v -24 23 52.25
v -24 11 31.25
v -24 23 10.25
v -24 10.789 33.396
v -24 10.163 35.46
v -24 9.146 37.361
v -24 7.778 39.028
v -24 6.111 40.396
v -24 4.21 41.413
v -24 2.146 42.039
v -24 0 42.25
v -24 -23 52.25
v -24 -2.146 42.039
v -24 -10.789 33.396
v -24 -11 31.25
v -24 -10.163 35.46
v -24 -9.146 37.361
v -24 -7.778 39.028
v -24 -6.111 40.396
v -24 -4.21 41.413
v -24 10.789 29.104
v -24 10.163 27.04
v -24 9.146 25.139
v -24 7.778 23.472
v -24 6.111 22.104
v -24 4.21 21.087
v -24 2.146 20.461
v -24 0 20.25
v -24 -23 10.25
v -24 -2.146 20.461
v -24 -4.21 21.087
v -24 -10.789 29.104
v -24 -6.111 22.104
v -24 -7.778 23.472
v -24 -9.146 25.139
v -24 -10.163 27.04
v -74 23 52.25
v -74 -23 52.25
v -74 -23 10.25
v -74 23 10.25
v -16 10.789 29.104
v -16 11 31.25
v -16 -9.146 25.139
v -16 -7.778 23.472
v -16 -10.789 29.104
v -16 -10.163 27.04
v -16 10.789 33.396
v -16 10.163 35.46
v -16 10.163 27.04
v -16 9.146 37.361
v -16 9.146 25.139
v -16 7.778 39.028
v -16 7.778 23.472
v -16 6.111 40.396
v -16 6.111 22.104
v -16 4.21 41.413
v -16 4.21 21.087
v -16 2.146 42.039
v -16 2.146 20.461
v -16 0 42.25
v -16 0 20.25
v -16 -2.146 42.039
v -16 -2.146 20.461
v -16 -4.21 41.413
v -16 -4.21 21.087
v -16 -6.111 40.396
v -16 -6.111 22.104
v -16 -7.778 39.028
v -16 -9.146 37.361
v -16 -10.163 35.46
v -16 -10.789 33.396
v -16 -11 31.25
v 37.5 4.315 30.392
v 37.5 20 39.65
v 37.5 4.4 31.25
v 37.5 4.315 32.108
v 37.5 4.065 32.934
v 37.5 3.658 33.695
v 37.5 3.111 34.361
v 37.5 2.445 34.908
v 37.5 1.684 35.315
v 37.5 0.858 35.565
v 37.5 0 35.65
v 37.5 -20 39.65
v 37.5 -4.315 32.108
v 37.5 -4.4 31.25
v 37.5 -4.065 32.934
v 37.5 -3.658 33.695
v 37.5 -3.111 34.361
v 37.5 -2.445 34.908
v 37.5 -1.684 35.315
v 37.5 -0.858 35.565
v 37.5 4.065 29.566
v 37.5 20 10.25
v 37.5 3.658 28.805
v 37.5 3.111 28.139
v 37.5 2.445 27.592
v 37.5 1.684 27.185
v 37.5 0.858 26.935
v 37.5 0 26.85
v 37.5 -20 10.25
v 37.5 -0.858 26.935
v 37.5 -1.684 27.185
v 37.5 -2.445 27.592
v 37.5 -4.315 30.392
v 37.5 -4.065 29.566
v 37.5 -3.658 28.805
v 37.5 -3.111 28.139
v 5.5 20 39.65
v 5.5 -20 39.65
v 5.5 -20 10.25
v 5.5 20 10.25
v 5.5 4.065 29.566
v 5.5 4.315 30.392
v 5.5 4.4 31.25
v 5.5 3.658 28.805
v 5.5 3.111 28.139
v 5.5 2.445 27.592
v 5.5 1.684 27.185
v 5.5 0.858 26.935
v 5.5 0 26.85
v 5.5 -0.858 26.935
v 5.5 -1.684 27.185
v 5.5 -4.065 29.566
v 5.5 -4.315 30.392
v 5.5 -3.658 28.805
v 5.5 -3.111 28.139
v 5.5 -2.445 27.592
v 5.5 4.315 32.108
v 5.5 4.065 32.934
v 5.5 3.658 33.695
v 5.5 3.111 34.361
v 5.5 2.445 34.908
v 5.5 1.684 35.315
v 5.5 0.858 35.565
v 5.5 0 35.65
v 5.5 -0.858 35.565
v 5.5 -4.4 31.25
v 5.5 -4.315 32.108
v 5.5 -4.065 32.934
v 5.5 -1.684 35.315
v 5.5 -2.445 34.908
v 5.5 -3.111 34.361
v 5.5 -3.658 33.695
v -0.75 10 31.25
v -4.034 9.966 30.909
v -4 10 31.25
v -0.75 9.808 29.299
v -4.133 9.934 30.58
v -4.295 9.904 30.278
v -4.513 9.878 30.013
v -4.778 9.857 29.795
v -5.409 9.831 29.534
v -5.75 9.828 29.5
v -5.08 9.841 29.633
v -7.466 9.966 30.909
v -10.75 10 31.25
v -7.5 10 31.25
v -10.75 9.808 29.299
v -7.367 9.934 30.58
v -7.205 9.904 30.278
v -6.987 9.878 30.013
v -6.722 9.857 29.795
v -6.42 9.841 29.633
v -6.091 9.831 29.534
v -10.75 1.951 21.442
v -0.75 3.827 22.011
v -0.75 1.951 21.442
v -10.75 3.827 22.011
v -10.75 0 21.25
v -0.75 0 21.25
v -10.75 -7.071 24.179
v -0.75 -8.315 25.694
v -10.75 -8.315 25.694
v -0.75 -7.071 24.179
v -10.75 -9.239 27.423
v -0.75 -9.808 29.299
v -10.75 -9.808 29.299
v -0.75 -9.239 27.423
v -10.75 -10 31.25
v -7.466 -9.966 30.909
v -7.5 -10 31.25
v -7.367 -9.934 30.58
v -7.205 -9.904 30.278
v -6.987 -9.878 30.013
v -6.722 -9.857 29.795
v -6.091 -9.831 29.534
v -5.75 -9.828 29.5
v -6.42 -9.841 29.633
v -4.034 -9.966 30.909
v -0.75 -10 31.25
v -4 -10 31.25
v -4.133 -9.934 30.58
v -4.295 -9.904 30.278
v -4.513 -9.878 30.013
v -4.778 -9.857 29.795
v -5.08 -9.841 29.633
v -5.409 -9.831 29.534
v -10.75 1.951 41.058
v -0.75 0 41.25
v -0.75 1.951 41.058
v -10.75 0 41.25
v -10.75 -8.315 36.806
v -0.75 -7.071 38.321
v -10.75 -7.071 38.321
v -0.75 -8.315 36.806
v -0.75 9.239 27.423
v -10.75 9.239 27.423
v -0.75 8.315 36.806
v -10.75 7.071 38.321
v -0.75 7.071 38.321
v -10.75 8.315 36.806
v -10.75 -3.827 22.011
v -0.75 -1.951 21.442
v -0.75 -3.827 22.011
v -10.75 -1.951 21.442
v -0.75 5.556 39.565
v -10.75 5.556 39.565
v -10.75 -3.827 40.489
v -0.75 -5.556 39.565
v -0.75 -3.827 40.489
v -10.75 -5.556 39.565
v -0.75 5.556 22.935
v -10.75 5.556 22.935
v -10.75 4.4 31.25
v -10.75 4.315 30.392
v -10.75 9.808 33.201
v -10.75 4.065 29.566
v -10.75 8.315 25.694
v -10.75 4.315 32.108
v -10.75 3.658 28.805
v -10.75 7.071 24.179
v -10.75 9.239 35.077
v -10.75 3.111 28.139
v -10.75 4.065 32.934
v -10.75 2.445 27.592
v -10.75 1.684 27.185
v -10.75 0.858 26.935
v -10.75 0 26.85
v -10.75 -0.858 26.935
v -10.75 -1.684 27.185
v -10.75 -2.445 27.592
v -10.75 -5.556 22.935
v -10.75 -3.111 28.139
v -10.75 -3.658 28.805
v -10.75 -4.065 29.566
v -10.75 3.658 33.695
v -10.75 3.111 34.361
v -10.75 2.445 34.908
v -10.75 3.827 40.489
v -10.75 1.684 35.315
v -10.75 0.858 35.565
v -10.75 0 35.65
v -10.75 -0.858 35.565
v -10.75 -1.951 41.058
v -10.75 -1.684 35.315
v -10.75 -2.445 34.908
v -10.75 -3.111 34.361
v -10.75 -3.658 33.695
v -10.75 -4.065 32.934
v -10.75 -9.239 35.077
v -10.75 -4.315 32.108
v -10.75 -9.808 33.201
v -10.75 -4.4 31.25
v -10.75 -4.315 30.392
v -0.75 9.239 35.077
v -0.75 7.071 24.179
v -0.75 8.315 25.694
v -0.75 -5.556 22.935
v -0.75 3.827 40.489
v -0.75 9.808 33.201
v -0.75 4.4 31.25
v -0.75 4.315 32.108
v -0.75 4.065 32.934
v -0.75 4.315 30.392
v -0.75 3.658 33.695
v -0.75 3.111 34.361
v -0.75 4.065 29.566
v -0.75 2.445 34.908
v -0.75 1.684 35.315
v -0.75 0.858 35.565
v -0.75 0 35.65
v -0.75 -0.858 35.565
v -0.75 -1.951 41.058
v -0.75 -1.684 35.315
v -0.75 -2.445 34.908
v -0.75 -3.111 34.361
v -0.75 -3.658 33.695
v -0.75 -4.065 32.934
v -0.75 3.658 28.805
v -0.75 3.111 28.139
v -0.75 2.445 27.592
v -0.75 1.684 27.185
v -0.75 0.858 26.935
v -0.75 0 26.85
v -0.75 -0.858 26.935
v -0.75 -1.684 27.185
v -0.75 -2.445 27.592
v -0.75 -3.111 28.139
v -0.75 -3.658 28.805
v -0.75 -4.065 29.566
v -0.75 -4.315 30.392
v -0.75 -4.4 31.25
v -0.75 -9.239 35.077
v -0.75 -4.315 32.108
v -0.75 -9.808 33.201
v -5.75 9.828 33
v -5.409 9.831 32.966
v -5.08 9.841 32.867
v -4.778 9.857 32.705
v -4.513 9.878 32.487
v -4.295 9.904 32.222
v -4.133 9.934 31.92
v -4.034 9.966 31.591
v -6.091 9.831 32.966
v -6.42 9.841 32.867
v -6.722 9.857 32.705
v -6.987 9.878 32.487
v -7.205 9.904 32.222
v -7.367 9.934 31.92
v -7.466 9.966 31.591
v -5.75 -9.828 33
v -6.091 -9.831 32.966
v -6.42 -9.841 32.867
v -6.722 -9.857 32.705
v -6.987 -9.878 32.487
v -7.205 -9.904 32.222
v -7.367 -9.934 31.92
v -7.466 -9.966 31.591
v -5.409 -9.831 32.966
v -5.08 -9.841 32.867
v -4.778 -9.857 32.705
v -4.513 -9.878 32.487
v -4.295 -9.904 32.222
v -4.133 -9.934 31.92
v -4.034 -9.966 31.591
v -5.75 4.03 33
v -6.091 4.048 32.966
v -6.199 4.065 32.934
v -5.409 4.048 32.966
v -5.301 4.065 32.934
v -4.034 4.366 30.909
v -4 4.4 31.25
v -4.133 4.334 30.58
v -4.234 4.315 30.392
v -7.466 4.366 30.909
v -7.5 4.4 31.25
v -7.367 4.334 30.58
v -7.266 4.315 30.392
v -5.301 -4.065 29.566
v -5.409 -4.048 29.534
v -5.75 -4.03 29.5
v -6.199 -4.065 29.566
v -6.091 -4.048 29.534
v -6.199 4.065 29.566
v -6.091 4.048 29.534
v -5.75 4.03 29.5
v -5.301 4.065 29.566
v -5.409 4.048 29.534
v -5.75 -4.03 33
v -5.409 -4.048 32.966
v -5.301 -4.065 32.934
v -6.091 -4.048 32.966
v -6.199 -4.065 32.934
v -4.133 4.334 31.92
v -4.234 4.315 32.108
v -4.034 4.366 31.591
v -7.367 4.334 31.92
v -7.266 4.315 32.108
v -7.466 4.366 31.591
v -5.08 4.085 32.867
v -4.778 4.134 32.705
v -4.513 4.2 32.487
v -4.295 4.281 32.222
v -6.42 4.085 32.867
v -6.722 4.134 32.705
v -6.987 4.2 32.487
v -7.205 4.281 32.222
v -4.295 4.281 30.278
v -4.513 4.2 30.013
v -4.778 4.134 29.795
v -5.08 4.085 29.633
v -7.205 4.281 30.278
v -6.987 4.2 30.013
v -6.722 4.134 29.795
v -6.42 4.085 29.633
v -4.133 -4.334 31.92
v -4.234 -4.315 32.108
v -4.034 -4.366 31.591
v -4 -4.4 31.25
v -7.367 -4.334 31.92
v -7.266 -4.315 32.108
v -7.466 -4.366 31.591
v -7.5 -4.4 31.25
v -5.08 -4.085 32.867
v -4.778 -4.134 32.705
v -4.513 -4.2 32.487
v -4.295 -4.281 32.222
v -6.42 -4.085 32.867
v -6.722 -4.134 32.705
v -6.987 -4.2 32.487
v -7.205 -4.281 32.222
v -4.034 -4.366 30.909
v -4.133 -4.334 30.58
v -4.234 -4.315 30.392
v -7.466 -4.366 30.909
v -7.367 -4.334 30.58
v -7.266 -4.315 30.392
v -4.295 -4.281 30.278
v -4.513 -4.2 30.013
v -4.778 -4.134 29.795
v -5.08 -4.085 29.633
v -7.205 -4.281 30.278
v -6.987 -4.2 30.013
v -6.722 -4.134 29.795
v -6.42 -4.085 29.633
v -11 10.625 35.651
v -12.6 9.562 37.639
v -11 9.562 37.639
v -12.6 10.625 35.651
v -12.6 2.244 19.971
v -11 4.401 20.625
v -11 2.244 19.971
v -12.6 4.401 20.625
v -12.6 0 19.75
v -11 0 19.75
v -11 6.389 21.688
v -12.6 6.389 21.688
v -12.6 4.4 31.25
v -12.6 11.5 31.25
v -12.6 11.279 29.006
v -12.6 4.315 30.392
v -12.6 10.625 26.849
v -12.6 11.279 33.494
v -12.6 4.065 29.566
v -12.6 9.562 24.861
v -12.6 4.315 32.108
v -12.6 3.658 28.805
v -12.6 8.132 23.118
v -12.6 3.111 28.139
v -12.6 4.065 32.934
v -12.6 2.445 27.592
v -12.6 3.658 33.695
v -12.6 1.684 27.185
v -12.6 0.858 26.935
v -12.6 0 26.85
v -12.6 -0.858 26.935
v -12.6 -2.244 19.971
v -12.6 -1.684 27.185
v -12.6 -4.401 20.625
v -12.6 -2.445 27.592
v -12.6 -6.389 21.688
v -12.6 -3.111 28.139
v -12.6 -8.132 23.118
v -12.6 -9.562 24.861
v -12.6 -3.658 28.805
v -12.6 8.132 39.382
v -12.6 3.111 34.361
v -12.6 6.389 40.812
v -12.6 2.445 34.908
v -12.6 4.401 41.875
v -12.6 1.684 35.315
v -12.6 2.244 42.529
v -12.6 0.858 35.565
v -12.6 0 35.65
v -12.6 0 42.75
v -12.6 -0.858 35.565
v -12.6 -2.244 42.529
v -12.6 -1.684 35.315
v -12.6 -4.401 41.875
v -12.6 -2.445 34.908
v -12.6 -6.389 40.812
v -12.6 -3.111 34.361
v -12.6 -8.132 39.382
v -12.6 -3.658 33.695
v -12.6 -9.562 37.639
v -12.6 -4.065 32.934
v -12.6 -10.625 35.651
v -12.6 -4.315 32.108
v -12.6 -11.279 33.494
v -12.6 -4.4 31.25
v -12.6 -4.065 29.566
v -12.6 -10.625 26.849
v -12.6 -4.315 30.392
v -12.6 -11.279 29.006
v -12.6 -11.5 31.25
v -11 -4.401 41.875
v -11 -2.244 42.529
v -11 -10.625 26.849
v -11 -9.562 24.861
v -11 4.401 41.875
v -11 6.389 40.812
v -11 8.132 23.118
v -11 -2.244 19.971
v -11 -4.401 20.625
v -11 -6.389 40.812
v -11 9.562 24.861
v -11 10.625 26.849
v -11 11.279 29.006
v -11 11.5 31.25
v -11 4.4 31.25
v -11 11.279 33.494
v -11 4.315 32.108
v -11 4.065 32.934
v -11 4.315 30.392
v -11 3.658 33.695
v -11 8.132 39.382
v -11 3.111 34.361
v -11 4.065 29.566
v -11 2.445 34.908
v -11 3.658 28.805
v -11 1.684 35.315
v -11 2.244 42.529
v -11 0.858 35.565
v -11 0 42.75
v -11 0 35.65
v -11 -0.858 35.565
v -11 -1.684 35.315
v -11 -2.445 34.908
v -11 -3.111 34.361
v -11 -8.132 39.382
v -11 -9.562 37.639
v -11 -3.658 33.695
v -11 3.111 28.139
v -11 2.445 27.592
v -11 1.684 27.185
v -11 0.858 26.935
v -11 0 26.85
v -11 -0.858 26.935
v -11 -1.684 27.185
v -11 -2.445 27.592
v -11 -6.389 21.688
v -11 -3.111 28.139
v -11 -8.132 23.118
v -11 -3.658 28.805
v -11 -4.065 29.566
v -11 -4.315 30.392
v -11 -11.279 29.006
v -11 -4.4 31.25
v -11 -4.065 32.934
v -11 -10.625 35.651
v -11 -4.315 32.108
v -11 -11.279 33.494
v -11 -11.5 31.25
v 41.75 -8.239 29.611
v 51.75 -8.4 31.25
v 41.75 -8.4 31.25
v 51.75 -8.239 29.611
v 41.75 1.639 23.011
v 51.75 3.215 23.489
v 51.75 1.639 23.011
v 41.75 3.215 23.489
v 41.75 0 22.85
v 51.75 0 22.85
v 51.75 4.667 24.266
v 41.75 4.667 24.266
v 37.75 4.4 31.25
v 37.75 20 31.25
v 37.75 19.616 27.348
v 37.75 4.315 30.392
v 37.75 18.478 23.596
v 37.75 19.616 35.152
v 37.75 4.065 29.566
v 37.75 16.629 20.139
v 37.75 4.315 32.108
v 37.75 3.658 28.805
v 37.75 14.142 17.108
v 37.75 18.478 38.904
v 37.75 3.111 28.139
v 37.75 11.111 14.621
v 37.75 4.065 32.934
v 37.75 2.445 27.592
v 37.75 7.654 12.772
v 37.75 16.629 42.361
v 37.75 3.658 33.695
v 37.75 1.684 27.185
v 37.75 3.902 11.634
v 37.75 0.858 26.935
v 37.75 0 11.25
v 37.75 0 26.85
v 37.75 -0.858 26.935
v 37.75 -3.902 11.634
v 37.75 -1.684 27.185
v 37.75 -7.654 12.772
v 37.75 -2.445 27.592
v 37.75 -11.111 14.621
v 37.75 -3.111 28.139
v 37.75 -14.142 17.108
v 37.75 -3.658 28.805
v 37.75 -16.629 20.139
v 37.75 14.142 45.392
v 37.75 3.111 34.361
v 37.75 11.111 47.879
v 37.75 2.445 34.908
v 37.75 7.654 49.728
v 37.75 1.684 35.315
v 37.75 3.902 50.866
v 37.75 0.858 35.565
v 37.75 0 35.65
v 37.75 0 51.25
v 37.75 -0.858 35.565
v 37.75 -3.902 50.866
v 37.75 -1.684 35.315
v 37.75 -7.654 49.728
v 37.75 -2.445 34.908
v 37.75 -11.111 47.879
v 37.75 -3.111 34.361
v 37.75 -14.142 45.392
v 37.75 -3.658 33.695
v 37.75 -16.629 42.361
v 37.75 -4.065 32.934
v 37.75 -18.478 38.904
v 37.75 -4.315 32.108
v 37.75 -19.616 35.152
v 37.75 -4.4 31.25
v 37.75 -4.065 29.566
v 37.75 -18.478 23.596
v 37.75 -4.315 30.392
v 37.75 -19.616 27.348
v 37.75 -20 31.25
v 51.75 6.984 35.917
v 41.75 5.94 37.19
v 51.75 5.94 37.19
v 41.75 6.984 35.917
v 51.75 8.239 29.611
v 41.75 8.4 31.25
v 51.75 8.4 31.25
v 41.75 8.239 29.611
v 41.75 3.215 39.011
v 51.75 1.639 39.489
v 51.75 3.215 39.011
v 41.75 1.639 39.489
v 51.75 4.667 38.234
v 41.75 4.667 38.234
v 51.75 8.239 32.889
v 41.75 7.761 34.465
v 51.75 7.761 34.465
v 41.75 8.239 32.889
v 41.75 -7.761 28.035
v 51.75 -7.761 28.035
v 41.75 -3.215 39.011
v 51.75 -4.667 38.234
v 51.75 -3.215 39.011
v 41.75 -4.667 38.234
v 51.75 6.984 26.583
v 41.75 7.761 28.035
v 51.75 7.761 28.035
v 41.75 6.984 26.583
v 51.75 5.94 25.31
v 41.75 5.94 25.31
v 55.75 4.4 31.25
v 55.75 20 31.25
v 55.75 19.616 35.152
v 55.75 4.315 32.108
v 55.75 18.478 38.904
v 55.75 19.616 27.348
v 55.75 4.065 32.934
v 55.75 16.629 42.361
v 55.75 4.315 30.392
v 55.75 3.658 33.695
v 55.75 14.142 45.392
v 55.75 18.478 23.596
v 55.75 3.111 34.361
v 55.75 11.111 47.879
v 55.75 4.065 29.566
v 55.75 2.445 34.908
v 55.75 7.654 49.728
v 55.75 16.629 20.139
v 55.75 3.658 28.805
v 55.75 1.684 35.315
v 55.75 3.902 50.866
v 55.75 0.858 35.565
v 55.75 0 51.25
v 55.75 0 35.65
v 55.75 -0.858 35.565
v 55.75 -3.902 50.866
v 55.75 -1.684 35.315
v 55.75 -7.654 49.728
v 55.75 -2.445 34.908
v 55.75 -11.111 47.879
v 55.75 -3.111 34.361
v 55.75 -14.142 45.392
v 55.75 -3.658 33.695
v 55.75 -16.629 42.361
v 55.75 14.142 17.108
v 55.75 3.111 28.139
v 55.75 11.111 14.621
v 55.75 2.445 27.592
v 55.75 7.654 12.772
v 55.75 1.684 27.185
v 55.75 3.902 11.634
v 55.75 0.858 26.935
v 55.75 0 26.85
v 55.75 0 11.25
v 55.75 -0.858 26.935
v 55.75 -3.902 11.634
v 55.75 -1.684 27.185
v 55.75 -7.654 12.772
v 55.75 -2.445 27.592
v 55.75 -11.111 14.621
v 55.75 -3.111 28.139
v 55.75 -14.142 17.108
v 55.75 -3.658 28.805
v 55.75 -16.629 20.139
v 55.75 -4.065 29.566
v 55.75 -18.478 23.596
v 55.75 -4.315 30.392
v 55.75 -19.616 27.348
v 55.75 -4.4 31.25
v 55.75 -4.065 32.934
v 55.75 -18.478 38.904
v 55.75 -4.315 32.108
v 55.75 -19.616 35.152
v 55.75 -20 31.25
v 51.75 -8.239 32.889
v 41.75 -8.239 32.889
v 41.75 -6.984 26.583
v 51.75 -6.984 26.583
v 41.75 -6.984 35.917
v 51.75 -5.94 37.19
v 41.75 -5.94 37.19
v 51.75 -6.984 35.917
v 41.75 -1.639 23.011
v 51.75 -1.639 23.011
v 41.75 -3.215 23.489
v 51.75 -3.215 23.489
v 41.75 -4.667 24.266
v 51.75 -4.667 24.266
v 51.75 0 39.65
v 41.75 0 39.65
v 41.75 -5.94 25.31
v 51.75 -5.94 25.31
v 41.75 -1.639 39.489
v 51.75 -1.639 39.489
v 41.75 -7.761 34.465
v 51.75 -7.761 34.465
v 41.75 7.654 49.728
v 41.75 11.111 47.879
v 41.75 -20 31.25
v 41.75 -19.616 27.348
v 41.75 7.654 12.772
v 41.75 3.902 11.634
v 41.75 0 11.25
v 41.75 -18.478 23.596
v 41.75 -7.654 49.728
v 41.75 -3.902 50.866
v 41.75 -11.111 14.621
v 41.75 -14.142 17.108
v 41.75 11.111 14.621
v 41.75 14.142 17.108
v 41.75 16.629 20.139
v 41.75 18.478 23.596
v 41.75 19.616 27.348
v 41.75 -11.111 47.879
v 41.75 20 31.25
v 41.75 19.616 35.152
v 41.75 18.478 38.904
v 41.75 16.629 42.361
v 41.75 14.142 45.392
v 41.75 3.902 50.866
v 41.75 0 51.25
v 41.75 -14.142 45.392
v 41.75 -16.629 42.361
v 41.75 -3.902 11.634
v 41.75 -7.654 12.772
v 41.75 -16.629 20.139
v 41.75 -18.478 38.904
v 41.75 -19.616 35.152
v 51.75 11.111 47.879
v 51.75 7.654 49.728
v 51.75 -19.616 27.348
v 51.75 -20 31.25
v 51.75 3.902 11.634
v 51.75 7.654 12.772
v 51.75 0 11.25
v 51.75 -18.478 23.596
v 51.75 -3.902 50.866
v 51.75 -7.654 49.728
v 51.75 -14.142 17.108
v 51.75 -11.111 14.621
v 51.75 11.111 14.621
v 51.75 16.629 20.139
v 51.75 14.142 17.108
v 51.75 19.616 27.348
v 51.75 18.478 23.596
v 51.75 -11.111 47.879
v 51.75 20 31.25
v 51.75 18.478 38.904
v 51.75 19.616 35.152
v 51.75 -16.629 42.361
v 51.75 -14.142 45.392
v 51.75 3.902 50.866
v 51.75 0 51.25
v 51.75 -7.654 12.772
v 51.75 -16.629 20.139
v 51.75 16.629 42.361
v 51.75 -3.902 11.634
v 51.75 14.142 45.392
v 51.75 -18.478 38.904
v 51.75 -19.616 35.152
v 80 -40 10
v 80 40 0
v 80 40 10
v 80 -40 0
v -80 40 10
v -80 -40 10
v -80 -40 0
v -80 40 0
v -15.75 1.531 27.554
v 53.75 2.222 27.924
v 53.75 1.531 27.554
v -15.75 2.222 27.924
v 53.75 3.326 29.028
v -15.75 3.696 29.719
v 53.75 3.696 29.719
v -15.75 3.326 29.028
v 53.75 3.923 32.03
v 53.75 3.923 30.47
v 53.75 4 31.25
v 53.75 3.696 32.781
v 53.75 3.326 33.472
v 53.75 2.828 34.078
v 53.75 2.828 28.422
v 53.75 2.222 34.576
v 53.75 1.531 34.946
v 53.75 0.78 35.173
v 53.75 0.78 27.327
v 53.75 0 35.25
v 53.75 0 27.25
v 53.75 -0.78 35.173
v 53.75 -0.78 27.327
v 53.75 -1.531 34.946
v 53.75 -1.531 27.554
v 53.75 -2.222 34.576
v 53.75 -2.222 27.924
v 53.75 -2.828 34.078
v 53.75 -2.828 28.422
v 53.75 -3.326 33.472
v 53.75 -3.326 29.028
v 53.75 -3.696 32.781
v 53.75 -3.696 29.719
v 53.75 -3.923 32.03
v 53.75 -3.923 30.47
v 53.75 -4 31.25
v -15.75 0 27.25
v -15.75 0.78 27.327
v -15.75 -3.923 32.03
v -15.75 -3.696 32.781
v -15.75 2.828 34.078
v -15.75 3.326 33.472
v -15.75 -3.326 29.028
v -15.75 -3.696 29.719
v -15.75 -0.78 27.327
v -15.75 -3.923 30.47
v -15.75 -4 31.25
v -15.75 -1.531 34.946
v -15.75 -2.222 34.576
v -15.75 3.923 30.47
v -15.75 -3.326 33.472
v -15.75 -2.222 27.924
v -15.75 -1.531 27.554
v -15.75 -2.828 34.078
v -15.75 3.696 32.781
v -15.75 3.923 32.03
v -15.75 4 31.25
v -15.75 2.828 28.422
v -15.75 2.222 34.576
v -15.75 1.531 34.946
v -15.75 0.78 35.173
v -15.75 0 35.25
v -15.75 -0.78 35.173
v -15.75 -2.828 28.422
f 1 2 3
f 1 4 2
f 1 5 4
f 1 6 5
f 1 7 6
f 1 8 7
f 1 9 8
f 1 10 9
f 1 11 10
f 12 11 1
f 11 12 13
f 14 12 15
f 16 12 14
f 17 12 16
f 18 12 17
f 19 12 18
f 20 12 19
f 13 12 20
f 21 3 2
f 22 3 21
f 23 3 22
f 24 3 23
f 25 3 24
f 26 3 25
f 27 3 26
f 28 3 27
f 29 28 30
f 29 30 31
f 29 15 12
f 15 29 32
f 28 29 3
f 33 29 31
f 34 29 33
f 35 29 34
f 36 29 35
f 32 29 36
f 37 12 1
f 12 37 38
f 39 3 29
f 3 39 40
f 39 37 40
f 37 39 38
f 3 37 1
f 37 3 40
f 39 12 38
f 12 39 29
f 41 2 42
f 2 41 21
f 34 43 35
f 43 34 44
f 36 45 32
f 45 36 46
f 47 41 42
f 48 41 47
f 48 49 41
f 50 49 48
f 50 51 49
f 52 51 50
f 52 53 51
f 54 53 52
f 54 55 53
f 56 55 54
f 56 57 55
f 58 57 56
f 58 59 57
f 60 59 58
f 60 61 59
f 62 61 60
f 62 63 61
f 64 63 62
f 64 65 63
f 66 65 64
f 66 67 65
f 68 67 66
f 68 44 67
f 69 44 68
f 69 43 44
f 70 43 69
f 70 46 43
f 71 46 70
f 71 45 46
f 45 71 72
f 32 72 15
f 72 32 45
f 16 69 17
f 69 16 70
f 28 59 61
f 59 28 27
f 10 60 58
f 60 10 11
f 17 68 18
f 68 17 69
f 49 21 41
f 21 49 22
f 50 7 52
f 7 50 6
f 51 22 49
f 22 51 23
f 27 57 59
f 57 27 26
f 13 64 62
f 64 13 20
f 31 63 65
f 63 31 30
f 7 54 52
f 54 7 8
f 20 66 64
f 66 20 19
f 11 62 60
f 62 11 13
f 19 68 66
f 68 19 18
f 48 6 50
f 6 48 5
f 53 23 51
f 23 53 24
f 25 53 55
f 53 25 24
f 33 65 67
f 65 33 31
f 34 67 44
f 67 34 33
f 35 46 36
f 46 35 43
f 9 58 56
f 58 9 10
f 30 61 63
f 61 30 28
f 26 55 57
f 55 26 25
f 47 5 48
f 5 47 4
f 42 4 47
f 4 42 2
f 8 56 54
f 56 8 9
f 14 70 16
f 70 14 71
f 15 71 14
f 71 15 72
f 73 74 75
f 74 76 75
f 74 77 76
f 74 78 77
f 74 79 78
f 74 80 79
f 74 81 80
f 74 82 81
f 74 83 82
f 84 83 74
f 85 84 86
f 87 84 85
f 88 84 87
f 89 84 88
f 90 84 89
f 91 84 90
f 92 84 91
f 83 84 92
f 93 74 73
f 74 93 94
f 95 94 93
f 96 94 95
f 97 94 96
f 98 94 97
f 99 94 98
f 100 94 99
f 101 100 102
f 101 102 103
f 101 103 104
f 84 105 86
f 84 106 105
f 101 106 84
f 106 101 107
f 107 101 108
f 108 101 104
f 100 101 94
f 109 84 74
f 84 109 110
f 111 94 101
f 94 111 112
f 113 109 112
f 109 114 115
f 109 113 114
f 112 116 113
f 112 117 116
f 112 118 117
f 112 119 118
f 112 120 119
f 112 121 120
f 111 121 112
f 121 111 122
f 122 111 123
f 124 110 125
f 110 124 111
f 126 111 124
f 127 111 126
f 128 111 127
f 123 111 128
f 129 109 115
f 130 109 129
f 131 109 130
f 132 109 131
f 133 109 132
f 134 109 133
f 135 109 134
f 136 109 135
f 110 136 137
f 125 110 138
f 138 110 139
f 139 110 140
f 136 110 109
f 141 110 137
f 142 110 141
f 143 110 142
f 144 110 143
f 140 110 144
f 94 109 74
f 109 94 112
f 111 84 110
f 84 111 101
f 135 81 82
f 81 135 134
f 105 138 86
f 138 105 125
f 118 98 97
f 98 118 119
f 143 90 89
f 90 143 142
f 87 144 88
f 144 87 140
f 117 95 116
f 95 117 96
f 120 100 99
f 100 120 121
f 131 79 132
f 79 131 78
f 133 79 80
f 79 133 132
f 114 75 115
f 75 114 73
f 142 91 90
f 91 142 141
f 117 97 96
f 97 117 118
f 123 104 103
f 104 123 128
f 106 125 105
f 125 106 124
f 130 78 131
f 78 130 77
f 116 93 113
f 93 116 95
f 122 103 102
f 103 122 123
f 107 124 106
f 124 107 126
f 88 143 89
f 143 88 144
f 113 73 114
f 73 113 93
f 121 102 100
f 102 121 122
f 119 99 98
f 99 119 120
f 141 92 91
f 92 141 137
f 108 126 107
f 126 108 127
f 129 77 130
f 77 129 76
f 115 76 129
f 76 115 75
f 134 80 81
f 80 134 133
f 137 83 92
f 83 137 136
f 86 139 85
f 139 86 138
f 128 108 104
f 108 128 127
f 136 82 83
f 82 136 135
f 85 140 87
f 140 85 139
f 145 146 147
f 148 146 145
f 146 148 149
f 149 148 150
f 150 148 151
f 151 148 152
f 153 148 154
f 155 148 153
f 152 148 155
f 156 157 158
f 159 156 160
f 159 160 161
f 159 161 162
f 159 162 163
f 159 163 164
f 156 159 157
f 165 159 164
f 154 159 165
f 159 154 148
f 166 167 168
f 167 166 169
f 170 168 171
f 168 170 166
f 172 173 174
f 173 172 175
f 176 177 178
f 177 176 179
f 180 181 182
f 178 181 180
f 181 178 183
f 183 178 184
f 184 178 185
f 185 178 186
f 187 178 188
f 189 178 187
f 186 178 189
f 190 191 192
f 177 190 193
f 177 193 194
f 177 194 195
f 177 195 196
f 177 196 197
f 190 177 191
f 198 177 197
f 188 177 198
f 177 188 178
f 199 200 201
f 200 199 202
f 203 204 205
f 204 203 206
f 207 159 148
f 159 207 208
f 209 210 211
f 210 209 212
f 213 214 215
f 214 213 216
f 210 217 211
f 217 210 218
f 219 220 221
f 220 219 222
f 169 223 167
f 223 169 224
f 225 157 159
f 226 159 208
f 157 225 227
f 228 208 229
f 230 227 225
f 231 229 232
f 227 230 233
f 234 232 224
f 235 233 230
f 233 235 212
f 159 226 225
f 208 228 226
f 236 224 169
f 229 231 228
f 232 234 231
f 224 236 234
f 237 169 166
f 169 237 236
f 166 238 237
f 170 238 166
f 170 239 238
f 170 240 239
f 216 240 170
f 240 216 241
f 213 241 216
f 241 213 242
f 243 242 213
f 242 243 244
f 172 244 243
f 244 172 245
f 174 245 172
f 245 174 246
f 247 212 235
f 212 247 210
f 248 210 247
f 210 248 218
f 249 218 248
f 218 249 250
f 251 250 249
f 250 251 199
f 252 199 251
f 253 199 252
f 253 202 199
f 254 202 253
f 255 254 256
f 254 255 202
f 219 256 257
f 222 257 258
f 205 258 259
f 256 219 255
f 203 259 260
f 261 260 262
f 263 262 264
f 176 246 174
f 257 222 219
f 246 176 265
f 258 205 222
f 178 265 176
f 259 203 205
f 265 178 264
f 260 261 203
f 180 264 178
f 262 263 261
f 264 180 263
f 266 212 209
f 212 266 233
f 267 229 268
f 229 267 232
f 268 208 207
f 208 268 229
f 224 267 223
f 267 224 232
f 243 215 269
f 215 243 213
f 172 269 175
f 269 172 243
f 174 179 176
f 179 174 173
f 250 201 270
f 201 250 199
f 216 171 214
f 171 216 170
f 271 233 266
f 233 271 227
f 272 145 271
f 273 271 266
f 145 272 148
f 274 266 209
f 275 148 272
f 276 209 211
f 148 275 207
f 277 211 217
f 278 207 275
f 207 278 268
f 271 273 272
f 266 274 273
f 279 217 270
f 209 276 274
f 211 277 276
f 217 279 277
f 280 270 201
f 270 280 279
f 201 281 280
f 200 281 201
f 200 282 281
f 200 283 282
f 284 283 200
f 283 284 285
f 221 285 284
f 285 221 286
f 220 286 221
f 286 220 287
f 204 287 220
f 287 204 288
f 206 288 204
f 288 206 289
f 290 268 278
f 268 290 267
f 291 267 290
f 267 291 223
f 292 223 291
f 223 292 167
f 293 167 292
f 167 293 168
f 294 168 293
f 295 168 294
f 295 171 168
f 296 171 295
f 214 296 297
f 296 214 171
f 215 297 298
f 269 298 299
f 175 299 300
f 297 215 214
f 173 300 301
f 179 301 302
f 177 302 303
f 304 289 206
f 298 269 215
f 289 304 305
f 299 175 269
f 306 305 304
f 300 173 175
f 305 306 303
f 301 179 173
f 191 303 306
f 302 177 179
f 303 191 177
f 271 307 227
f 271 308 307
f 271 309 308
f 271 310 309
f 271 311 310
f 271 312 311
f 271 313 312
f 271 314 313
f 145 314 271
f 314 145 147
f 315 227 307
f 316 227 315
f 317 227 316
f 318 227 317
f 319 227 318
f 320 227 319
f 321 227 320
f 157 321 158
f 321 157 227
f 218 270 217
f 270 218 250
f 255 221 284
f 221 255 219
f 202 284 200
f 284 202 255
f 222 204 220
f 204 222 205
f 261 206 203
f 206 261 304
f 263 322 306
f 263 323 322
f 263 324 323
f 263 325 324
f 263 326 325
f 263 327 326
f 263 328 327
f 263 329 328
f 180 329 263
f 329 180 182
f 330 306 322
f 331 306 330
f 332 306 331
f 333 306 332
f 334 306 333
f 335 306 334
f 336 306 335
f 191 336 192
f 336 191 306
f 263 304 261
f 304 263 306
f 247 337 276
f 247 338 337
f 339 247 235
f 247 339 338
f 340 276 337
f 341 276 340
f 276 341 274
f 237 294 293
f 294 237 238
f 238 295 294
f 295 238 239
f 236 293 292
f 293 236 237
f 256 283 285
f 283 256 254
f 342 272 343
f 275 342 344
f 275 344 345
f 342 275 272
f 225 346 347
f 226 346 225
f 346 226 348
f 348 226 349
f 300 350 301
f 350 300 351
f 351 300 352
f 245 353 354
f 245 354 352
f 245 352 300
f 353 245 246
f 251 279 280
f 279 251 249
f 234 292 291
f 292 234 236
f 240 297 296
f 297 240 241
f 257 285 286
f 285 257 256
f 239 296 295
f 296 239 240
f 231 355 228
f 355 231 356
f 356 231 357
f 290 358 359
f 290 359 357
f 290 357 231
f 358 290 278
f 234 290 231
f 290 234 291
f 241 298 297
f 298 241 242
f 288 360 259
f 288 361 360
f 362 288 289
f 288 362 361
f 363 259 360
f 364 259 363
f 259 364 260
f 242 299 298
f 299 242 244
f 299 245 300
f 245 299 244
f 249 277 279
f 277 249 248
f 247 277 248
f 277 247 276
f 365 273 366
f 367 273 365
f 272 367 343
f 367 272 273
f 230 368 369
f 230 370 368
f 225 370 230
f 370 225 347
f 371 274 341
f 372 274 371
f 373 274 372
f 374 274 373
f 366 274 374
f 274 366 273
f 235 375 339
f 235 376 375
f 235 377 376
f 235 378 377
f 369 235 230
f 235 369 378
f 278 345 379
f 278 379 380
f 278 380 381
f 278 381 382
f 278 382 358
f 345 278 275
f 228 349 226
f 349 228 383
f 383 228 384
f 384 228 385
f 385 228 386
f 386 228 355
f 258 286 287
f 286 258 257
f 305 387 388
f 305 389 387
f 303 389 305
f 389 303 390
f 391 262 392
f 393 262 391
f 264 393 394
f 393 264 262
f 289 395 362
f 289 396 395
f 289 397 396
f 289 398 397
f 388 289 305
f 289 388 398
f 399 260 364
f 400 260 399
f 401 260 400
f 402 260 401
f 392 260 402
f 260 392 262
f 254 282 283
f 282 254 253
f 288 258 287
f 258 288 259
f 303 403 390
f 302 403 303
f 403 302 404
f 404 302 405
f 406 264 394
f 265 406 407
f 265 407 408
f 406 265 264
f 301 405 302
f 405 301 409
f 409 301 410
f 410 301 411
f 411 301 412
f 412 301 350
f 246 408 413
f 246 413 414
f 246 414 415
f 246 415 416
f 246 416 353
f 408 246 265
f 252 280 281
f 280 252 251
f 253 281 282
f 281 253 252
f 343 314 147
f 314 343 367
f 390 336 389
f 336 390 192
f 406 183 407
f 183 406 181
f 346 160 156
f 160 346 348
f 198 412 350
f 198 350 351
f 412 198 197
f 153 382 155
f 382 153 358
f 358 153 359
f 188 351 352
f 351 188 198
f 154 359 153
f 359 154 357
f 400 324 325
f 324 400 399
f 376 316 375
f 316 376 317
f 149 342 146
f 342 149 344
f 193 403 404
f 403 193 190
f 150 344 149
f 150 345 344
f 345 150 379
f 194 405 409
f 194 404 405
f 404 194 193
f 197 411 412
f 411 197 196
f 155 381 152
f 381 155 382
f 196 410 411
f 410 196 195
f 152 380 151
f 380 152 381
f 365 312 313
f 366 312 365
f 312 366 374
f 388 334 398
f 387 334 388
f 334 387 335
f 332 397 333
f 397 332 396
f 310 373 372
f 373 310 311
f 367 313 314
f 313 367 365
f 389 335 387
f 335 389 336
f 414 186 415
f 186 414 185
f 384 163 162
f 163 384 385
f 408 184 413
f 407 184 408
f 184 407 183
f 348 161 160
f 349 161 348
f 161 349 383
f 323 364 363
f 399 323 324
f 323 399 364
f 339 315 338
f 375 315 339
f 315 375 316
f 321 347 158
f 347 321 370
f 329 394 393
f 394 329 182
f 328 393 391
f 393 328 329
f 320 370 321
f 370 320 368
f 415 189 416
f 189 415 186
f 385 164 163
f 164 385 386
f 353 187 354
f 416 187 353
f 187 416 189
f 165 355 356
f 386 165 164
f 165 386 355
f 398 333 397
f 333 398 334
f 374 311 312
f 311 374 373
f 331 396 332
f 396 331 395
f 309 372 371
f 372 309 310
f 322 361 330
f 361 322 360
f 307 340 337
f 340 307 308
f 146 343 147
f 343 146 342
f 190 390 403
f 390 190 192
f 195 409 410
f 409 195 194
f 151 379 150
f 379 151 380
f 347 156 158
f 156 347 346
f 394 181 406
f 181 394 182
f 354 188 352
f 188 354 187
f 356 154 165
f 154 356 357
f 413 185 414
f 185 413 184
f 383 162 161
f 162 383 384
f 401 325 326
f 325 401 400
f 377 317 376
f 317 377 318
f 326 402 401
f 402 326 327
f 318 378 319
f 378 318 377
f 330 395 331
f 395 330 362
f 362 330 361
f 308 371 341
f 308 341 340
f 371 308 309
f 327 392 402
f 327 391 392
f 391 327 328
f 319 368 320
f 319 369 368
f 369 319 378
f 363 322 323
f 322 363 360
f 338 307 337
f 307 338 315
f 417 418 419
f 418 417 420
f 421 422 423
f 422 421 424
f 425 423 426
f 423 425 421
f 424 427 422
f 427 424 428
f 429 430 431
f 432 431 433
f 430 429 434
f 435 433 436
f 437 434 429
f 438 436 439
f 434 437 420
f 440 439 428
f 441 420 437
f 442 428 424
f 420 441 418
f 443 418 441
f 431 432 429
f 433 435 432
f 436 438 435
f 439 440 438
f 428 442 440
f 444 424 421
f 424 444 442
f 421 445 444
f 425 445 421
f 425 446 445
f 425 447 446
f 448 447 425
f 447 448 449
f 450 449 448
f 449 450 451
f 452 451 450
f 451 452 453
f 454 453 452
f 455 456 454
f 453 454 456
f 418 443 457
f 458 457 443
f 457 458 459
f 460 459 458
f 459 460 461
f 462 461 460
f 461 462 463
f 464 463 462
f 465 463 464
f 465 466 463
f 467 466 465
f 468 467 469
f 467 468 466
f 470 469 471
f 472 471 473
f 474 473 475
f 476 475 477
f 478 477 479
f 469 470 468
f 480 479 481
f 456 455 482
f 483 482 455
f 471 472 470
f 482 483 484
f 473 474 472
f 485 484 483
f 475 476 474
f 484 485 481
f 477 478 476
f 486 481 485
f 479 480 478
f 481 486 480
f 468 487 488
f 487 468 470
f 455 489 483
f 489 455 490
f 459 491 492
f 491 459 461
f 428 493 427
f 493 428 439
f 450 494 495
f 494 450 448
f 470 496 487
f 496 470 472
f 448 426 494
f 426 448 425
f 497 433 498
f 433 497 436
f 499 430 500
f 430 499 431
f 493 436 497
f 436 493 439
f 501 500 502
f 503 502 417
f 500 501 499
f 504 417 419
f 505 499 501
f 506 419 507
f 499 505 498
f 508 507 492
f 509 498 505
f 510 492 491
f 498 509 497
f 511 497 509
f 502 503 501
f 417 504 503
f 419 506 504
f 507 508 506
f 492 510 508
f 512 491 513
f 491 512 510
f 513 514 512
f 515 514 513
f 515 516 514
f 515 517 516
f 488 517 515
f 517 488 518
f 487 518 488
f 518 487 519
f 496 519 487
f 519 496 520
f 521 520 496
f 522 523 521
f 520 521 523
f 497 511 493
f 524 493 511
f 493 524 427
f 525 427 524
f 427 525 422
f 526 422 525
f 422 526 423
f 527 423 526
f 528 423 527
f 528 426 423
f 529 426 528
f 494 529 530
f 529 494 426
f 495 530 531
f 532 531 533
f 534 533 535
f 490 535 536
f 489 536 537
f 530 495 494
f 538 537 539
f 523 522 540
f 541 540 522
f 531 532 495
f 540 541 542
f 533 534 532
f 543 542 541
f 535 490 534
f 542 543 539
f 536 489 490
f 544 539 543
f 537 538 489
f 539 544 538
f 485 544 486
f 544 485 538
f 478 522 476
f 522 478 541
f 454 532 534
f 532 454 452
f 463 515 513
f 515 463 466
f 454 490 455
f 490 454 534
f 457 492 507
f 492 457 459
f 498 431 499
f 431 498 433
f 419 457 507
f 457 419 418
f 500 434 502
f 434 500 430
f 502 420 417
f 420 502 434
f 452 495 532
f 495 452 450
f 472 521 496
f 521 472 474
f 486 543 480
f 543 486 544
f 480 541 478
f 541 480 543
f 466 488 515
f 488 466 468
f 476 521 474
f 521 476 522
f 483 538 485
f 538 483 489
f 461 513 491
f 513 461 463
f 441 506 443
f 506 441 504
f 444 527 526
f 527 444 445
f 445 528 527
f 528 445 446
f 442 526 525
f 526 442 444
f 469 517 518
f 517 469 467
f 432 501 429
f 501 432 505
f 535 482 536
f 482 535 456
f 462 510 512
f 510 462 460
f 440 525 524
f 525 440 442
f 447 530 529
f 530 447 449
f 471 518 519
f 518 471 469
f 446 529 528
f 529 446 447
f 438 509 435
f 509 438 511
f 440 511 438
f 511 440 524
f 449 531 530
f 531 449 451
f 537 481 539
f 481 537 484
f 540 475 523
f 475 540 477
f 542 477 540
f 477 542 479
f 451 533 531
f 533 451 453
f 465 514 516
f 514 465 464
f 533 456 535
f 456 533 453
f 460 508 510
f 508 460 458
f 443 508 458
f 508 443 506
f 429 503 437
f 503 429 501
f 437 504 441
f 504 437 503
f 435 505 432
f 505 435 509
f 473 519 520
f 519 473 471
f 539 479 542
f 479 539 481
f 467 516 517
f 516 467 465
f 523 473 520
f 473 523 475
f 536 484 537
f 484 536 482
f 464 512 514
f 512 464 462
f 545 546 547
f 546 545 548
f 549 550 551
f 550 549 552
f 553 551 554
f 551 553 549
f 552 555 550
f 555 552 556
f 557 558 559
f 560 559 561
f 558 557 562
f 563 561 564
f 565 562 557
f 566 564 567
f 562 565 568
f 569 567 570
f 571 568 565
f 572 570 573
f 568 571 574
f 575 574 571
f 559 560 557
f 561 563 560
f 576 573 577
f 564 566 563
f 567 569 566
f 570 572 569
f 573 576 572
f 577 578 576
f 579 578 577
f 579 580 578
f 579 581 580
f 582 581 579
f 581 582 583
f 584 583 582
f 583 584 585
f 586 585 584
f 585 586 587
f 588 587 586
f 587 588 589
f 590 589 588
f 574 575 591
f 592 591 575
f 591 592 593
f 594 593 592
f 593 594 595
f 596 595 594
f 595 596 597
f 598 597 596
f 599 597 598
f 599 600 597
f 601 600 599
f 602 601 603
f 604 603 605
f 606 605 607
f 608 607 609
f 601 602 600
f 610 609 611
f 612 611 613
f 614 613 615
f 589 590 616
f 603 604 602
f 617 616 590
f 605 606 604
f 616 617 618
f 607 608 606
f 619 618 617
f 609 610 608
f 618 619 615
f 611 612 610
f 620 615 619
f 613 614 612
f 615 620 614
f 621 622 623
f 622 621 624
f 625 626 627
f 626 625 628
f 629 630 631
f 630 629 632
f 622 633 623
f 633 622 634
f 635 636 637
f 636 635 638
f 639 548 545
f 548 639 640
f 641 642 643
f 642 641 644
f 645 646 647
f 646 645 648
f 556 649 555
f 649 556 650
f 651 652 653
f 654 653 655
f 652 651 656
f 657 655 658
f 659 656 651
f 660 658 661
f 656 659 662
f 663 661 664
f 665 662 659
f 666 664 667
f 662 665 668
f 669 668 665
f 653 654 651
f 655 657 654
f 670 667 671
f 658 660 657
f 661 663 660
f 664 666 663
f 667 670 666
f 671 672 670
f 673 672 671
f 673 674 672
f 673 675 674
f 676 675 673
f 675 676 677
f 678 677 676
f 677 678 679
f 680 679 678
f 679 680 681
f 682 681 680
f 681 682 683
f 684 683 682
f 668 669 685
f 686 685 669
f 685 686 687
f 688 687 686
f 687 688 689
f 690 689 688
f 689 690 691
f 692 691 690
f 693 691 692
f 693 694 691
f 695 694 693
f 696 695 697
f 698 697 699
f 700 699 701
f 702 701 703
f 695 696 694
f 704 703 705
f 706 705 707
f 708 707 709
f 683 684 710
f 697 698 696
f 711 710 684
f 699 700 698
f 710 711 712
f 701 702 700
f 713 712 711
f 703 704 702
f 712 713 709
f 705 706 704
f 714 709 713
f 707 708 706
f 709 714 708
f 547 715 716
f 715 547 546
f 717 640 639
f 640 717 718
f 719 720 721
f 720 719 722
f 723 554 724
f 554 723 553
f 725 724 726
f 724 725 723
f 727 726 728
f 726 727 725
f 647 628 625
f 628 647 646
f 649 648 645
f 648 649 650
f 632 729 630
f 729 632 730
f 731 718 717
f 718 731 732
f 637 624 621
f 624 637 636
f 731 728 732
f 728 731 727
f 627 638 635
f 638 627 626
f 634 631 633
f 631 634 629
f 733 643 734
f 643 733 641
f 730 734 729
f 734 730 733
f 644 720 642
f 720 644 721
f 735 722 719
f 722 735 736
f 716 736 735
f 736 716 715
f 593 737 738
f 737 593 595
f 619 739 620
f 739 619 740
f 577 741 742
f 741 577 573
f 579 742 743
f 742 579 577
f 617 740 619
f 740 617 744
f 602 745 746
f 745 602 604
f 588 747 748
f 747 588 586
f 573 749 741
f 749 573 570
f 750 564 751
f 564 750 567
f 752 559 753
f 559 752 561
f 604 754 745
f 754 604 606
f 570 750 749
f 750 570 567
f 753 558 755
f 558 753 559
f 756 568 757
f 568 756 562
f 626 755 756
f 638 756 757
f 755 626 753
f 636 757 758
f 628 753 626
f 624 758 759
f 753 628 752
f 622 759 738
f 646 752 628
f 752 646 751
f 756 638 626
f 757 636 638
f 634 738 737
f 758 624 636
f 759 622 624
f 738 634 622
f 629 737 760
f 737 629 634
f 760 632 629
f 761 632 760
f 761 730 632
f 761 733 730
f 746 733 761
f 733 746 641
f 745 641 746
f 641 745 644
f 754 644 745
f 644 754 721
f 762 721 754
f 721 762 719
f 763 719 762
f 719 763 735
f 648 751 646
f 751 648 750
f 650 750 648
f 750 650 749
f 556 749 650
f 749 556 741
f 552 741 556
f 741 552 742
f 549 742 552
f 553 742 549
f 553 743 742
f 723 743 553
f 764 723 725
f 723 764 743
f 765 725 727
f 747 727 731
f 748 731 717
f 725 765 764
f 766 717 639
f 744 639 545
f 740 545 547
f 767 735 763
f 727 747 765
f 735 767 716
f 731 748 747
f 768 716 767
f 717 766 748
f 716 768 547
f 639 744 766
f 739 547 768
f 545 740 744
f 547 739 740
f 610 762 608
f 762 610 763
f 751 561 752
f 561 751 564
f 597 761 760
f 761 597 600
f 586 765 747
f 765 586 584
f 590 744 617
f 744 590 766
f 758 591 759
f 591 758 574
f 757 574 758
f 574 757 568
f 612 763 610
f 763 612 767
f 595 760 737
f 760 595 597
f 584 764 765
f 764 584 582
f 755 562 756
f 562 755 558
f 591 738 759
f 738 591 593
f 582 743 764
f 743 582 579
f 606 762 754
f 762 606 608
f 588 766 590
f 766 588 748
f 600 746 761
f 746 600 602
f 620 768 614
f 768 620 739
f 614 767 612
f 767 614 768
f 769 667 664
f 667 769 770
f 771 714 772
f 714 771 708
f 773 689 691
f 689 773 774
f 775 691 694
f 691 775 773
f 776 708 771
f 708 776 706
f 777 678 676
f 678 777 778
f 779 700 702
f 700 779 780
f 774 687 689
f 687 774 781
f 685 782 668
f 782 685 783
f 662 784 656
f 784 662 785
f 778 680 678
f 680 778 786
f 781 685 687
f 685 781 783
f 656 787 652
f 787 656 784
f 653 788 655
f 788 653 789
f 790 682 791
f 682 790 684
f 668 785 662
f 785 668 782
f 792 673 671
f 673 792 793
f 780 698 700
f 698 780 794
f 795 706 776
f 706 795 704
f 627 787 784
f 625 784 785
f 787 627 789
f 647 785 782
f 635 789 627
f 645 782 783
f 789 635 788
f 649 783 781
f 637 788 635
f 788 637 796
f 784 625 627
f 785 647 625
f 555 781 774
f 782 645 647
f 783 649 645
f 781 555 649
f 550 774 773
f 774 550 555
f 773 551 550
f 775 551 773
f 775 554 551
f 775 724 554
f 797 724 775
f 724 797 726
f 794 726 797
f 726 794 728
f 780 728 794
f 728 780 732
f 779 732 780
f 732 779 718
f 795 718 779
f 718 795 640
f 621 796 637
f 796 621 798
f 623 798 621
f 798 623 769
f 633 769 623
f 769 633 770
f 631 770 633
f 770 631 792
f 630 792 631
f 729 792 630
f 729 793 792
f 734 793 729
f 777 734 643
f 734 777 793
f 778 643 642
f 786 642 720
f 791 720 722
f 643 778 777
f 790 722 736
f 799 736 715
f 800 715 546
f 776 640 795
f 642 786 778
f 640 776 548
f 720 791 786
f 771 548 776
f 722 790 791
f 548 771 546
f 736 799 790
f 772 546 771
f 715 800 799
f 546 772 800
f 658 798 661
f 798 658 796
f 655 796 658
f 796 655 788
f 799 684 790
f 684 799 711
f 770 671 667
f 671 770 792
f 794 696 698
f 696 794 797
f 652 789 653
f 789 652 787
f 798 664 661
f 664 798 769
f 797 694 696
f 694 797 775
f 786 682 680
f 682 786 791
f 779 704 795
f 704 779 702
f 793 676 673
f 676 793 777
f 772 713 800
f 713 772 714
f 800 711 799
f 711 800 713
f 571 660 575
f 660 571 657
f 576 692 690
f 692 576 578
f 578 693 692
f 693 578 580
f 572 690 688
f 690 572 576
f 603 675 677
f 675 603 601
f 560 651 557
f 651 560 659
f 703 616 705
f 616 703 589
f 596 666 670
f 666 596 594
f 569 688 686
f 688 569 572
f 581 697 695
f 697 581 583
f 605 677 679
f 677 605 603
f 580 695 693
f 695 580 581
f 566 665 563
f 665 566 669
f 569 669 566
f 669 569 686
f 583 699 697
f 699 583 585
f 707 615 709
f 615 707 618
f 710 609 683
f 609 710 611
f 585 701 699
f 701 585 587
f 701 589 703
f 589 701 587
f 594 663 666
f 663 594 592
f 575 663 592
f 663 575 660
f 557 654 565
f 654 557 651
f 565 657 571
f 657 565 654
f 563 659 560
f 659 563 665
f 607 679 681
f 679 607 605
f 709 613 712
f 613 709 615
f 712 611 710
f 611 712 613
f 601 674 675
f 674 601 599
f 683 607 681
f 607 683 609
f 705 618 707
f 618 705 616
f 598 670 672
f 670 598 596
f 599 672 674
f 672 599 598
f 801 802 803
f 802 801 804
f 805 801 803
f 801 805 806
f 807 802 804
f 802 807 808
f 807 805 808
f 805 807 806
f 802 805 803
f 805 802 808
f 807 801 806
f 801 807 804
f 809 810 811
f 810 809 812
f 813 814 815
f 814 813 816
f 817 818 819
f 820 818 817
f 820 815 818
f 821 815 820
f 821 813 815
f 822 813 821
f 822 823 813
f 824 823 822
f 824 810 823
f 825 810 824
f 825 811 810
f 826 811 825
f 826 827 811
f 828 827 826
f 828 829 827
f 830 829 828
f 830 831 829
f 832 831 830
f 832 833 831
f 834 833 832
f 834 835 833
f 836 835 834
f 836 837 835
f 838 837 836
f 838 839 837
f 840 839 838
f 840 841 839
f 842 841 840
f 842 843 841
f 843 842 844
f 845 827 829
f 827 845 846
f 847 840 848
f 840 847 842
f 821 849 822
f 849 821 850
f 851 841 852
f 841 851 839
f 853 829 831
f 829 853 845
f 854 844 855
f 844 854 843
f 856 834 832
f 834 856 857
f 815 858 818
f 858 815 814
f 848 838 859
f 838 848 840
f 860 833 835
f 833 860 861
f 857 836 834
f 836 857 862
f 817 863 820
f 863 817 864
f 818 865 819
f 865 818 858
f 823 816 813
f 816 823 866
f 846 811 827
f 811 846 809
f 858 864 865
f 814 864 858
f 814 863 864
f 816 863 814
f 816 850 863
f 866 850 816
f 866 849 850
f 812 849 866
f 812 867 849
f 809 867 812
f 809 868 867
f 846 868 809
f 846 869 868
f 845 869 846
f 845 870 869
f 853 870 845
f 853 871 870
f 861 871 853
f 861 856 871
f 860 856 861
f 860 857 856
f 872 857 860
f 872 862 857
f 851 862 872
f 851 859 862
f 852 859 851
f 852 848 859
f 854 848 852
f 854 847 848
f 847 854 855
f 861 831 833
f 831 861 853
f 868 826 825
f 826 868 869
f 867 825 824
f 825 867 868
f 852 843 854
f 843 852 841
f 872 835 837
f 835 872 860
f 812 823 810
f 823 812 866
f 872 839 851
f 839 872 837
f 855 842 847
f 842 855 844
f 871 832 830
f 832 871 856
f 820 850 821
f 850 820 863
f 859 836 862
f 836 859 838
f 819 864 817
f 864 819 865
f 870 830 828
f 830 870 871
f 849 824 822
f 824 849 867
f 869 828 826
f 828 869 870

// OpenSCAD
$fn = 32;

// ------------------------------------------------------------------------
// Motor drive station: motor 50 x 42 mm, shaft d8, pulley d40
// Every part is its own module, assembly() places every instance.
// ------------------------------------------------------------------------

// --- part 1 ---
module station_bed() {
  difference() {
    translate([-80, -40, 0]) cube([160, 80, 10]);
  }
}

// --- part 2 ---
module drive_motor() {
  union() {
    translate([-25, -23, 0]) cube([50, 46, 42]);
    translate([29, 0, 21]) rotate([0, 90, 0]) cylinder(h = 8, d = 22, center = true);
  }
}

// --- part 3 ---
module pillow_block() {
  difference() {
    translate([-16, -20, 0]) cube([32, 40, 29.4]);
    translate([0, 0, 21]) rotate([0, 90, 0]) cylinder(h = 34, d = 8.8, center = true);
  }
}

// --- part 4 ---
module drive_shaft() {
  translate([0, 0, -34.75]) cylinder(h = 69.5, d = 8);
}

// --- part 5 ---
module shaft_collar() {
  difference() {
    cylinder(h = 10, d = 20);
    translate([0, 0, -1]) cylinder(h = 12, d = 8.8);
    translate([0, 0, 5]) rotate([90, 0, 0]) cylinder(h = 22, d = 3.5, center = true);
  }
}

// --- part 6 ---
module collar_washer() {
  difference() {
      translate([0, 0, 0]) cylinder(h = 1.6, d = 23);
      translate([0, 0, -1]) cylinder(h = 3.6, d = 8.8);
    }
}

// --- part 7 ---
module drive_pulley() {
  difference() {
    union() {
      cylinder(h = 18, d = 16.8);
      cylinder(h = 4, d = 40);
      translate([0, 0, 14]) cylinder(h = 4, d = 40);
    }
    translate([0, 0, -1]) cylinder(h = 20, d = 8.8);
  }
}

// --- assembly ---
module assembly() {
  color([0.80, 0.24, 0.20]) translate([0, 0, 0]) rotate([0, 0, 0]) station_bed();
  color([0.20, 0.45, 0.75]) translate([-49, 0, 10.25]) rotate([0, 0, 0]) drive_motor();
  color([0.25, 0.62, 0.32]) translate([21.5, 0, 10.25]) rotate([0, 0, 0]) pillow_block();
  color([0.92, 0.70, 0.18]) translate([19, 0, 31.25]) rotate([0, 90, 0]) drive_shaft();
  color([0.58, 0.35, 0.70]) translate([-10.75, 0, 31.25]) rotate([0, 90, 0]) shaft_collar();
  color([0.16, 0.66, 0.66]) translate([-12.6, 0, 31.25]) rotate([0, 90, 0]) collar_washer();
  color([0.85, 0.48, 0.18]) translate([37.75, 0, 31.25]) rotate([0, 90, 0]) drive_pulley();
}

assembly();
